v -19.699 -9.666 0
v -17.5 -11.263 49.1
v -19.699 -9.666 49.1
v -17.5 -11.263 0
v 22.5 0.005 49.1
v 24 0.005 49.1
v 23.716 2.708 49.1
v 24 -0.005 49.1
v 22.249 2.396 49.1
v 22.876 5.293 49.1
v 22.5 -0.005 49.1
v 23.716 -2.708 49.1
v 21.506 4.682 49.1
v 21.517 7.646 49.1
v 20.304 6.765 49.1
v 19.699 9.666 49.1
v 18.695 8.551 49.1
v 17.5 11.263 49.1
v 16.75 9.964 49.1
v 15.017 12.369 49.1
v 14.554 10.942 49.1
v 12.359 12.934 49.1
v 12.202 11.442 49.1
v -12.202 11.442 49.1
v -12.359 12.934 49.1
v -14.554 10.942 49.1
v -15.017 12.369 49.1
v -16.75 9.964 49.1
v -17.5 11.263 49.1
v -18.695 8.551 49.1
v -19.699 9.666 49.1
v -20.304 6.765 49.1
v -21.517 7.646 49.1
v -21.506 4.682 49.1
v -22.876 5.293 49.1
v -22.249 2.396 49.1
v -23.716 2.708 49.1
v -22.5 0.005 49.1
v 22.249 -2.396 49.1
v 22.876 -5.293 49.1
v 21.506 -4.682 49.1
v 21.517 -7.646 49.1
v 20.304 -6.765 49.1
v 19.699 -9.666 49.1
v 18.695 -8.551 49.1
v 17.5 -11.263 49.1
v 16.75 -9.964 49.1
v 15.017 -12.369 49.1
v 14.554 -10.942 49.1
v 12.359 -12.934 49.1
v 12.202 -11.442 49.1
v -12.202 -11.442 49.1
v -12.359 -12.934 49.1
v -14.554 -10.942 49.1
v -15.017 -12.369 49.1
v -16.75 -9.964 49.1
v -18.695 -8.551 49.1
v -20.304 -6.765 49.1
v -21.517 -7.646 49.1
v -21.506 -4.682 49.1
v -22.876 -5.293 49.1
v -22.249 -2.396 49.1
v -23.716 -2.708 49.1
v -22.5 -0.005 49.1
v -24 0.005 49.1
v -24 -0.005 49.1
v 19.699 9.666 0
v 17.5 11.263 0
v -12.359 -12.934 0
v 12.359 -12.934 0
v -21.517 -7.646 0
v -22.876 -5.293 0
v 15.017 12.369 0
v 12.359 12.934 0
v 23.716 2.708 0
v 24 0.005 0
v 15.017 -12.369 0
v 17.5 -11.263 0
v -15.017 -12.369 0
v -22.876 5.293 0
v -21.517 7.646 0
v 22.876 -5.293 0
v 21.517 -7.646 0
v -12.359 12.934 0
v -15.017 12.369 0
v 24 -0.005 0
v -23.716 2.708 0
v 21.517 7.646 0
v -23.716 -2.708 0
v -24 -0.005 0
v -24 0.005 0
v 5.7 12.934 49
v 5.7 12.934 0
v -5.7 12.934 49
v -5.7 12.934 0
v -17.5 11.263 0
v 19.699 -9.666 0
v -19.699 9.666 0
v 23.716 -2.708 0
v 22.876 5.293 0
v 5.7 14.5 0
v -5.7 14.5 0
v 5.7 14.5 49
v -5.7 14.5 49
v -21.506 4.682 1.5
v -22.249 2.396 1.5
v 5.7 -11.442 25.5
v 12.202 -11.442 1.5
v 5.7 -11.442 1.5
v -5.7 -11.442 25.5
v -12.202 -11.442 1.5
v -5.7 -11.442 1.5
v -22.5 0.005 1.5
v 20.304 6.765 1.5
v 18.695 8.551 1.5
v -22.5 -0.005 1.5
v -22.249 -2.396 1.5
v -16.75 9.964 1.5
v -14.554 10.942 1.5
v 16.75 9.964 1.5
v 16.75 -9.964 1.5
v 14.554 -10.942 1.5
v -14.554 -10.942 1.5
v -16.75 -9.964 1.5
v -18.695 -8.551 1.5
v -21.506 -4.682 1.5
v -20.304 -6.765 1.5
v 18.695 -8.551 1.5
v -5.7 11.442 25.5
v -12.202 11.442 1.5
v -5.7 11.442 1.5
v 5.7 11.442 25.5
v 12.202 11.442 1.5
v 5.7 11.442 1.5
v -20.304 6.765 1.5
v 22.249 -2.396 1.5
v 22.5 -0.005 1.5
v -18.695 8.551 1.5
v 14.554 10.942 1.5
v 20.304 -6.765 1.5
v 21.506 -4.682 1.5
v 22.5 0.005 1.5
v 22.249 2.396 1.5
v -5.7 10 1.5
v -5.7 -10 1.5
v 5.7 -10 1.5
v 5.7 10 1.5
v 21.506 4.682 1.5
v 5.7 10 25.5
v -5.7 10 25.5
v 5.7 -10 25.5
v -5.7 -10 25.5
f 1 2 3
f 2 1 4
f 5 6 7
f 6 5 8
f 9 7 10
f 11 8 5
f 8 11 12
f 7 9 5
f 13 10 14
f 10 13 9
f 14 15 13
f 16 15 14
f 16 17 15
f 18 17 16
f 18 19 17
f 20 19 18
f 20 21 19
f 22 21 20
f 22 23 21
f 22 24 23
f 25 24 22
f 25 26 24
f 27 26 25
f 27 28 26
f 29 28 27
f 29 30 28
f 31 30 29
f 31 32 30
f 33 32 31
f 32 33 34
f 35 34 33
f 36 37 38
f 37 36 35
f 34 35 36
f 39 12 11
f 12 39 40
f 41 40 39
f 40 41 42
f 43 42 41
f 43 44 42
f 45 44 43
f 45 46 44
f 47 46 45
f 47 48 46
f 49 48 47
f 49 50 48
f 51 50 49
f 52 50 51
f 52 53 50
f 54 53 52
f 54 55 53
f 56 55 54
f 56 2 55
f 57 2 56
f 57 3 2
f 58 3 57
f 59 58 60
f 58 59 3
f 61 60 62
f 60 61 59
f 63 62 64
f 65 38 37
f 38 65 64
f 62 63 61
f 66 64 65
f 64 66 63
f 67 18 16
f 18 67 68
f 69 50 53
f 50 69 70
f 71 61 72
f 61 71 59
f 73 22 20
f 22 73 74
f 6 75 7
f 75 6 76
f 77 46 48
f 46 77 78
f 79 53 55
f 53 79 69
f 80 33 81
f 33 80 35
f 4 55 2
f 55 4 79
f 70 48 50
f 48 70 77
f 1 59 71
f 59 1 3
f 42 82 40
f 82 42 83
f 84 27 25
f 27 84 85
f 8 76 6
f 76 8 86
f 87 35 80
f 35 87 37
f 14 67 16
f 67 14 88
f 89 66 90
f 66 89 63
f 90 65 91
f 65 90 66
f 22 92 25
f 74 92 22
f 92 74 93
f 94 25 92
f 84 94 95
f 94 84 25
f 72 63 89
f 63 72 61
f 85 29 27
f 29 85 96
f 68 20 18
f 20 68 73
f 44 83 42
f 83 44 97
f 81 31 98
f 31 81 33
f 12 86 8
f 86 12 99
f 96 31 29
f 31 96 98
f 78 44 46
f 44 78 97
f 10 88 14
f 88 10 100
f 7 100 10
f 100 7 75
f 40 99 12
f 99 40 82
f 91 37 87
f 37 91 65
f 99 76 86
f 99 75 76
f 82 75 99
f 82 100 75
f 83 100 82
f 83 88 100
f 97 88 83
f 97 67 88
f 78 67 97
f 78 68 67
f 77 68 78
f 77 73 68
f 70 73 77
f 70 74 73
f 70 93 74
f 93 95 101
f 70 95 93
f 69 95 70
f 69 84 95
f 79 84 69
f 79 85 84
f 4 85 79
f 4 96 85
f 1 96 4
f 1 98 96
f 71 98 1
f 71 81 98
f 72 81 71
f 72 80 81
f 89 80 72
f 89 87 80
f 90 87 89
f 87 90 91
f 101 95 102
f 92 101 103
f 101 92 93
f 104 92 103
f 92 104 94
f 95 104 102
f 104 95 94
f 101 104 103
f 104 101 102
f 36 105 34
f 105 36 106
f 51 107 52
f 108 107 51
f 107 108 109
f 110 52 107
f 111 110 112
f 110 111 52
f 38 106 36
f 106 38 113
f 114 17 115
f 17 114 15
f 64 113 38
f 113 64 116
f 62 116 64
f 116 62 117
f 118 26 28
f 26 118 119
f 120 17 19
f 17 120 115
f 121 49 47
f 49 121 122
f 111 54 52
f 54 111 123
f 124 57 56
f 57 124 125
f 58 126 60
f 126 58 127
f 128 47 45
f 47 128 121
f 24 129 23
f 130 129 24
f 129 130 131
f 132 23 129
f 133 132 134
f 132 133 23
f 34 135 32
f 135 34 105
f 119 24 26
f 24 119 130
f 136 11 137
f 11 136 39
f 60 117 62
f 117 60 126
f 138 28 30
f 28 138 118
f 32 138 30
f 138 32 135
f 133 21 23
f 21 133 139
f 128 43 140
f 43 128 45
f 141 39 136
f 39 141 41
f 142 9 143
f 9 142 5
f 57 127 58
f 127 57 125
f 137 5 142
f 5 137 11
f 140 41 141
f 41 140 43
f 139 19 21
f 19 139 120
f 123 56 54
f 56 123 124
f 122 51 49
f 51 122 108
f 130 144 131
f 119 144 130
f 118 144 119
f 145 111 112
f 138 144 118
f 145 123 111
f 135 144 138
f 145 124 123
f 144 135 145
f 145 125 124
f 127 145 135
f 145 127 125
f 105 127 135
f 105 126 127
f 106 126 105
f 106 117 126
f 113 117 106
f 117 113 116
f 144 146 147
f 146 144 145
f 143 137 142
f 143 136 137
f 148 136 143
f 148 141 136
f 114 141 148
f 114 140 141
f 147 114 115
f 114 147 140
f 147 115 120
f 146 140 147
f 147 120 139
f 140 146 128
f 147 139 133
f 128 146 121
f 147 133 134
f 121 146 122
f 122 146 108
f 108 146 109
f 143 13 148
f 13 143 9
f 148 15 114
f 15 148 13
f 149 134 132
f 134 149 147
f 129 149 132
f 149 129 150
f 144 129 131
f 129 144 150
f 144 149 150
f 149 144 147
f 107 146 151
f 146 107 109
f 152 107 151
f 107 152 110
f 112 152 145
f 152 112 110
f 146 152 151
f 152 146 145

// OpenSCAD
ts=1.5;

noga=[48,26, 49];
ship=[11.4,1.5];
plt=[10.8,0.9,25.5];


difference(){
    union(){
        minkowski(){
            translate([0,0,noga.z/2]) cube([noga.x-noga.y,0.01,noga.z],true);
            cylinder(0.1, noga.y/2, noga.y/2);
        }
        translate([0,noga.y/2,noga.z/2]) cube([ship.x,ship.y*2,noga.z],true);
    }
    difference(){
        translate([0,0,ts])minkowski(){
            translate([0,0,noga.z]) cube([noga.x-noga.y,0.01,noga.z*2],true);
            cylinder(0.1, noga.y/2-ts, noga.y/2-ts);
        }
        translate([0,noga.y/2-ts,plt.z/2]) cube([ship.x,ship.y*2,plt.z],true);
        translate([0,-(noga.y/2-ts),plt.z/2]) cube([ship.x,ship.y*2,plt.z],true);
    }
}


module wire(){
    union(){
        translate([0,0,12.5]) cylinder(25, 0.9, 0.9, true);
        translate([0,0,25]) cylinder(7, 0.6, 0.6, true);
        translate([0,0,0.5]) cylinder(1.1, 1, 1, true);
    };
};
module pin(){
    union(){
        translate([0,0,14]) cube([5,5.1,28],true);
    }
};
module minus(){
    difference(){ pin();  wire();};
};
//pin();
//wire();
//minus();
module uho(){
    difference(){ cube([10,10,3],true); cylinder(6, 2.5, 2.5, true);};
};
module row(n){
    union() {
      translate([0,-7.5,1.5]) uho();
      for(i=[0:n]){  
        translate([0,i*5,0]){ minus();};
      };
      translate([0,7.5+(n*5),1.5]) uho();
    };
};

//row(8);
//uho();
